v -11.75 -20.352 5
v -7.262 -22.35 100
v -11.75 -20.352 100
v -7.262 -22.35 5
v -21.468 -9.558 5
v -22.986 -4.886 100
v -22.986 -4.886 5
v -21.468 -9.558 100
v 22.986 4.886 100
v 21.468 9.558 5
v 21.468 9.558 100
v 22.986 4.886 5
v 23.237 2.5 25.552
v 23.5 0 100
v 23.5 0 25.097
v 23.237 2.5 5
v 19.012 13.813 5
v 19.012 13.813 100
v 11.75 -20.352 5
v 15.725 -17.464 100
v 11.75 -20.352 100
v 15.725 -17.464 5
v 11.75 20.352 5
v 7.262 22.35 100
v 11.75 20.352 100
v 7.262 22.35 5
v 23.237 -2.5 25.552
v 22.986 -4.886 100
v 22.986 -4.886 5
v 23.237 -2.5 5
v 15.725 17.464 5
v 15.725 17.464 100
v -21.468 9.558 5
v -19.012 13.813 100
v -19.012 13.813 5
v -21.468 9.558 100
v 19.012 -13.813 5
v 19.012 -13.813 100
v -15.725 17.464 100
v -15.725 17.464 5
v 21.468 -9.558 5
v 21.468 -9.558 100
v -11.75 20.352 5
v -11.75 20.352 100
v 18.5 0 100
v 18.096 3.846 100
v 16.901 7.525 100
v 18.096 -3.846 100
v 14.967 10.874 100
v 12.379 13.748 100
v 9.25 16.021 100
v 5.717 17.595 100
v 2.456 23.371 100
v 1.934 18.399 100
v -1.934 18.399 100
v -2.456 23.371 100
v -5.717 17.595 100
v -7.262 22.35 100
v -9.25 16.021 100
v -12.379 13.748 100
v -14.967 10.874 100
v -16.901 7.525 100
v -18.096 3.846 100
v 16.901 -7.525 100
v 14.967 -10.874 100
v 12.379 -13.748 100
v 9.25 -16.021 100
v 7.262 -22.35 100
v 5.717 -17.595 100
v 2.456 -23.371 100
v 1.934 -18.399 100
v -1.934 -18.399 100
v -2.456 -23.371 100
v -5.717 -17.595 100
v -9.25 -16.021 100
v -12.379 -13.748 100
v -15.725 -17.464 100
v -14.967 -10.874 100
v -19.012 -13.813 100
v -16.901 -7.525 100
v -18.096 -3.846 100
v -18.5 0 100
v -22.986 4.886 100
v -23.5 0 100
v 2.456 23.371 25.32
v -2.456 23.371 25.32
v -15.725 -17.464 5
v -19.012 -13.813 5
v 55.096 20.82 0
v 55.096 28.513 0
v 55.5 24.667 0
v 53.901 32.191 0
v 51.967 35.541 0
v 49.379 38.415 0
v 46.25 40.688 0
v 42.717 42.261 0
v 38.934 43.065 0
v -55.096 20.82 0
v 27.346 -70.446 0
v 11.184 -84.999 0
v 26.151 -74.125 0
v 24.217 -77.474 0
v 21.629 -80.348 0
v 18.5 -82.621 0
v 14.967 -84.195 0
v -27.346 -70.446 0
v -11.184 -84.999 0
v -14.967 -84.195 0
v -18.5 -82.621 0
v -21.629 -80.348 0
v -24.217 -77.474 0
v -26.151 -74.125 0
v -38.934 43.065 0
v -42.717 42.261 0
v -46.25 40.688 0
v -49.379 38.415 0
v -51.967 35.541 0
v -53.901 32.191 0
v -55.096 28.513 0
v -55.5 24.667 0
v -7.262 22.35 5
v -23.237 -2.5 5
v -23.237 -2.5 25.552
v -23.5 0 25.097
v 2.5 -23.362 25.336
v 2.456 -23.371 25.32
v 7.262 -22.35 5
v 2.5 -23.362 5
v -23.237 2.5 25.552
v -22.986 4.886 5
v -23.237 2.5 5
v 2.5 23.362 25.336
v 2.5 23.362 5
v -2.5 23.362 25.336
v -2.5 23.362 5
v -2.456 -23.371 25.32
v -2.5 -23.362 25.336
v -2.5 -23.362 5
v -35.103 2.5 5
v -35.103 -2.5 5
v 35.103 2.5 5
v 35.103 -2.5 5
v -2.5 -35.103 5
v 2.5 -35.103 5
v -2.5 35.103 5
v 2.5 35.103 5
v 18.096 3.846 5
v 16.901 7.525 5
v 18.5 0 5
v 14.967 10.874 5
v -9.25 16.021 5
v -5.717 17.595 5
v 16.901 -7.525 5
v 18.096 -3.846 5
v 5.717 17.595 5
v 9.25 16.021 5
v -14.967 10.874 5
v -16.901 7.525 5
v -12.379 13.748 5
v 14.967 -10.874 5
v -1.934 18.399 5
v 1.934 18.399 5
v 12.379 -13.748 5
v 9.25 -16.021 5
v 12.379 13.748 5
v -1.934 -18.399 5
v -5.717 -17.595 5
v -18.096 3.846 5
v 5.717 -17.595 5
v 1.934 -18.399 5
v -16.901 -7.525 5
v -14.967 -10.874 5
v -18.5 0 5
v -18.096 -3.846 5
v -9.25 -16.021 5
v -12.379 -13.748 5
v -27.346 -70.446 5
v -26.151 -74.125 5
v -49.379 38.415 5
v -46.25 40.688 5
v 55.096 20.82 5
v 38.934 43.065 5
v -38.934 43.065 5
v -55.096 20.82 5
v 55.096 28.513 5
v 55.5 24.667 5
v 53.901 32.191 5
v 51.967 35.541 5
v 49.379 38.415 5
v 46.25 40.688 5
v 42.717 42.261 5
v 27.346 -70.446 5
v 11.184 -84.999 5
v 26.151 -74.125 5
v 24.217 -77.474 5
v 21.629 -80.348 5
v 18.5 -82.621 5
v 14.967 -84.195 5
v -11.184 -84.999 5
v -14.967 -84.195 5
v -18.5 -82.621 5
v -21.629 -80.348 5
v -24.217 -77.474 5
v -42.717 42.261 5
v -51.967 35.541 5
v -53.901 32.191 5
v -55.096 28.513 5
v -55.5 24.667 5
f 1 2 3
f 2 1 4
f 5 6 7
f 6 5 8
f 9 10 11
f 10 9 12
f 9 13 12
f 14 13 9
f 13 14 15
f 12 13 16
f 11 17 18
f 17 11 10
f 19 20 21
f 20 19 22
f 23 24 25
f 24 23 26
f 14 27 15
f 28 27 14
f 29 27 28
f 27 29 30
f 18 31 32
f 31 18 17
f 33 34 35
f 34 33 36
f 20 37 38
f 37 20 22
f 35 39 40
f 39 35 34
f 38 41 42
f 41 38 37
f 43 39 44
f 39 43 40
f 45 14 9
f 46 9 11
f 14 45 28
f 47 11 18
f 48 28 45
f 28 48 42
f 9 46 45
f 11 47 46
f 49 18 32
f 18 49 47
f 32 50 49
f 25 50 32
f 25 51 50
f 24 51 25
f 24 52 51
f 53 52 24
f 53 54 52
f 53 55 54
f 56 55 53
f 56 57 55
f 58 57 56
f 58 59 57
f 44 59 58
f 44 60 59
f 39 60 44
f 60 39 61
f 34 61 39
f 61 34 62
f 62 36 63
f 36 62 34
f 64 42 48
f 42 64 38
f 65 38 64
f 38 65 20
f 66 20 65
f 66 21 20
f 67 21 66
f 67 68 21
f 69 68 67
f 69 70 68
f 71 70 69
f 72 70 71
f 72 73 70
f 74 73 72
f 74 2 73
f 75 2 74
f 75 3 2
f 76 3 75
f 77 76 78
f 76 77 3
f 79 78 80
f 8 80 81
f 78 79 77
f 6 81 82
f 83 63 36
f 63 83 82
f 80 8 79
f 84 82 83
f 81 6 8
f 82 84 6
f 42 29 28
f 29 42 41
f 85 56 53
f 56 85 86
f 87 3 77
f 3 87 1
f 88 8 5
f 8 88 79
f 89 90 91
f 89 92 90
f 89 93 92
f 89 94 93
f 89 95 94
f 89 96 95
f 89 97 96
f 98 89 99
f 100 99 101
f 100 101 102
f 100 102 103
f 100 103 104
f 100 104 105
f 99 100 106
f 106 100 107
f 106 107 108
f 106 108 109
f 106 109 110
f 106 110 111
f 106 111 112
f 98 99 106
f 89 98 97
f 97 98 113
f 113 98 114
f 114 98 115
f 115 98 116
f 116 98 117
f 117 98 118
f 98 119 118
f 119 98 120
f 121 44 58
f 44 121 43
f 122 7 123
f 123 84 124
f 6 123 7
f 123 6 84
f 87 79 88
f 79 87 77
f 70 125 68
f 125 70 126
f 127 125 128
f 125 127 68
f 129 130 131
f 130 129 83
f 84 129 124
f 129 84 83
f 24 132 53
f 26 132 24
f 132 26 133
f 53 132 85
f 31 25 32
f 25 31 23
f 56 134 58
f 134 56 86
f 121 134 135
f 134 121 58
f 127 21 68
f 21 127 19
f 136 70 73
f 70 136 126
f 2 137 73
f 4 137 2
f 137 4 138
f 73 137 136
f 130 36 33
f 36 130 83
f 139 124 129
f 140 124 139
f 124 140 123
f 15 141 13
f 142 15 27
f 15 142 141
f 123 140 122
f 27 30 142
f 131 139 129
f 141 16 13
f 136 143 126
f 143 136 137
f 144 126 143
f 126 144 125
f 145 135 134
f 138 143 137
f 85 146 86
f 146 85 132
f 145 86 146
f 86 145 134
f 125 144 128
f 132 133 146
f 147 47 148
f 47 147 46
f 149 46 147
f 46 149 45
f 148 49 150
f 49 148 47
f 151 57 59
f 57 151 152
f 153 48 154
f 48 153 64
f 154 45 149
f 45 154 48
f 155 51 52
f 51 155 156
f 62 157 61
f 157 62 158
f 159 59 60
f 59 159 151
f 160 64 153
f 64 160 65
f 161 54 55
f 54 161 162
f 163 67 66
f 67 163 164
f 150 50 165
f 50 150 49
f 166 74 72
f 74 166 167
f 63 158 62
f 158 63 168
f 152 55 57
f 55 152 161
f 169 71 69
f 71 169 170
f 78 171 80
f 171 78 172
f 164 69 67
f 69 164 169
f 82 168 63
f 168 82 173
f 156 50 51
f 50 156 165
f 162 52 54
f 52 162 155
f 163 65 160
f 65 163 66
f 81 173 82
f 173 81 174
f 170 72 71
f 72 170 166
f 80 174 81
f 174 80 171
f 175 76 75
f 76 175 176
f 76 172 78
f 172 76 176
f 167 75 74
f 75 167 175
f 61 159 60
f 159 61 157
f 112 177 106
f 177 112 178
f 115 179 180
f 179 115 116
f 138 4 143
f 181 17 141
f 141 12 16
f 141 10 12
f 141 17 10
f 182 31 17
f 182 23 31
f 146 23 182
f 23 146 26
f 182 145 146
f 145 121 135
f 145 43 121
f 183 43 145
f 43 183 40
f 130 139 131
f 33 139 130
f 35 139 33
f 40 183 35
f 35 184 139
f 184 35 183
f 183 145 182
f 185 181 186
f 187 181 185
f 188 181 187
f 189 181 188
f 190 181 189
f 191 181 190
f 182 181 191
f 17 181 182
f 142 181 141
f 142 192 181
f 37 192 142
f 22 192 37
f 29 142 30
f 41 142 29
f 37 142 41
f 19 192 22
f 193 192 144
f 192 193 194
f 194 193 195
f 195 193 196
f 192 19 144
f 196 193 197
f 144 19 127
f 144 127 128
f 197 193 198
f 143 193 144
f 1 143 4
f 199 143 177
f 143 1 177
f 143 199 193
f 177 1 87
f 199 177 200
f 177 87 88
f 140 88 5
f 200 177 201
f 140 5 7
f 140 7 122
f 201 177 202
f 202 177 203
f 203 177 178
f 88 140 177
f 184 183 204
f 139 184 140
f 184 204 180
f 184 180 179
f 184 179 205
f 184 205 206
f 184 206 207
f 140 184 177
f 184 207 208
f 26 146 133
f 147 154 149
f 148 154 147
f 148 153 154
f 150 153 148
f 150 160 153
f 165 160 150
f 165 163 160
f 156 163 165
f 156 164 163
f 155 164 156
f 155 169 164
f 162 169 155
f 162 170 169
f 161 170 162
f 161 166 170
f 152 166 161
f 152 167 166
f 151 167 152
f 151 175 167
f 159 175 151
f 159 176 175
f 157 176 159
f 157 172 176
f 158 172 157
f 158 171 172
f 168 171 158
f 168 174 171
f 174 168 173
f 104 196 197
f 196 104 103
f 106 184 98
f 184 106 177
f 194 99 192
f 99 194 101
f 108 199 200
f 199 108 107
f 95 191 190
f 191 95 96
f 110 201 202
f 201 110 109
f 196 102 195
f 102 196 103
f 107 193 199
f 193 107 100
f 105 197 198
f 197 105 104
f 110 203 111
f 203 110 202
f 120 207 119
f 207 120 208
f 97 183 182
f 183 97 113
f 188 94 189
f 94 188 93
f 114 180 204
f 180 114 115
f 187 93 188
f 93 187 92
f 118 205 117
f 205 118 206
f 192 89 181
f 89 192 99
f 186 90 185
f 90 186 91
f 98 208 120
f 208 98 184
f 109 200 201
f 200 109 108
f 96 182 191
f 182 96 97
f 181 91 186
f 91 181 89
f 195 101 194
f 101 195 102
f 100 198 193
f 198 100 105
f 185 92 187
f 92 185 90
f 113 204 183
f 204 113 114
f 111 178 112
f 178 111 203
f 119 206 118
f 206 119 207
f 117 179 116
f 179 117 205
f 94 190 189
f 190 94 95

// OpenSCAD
// SPDX-FileCopyrightText: 2021 Jens Meisner <jens.meisner@ose-germany.de>
//
// SPDX-License-Identifier: CC-BY-SA-4.0

/*File Info--------------------------------------------------------------------
File Name: PoleBase.scad
Project Name: OpenHardware LOOM - OHLOOM
License: Attribution-ShareAlike 4.0 International (CC BY-SA 4.0) 
Name: Jens Meisner
Date: 08/01/20
Desc:  This file is part of the OHLOOM Project. Original design by Oliver Slueter, who made all wooden parts without a CNC Router. https://wiki.opensourceecology.de/Open_Hardware-Webstuhl_%E2%80%93_OHLOOM
Usage: 
./OHLoom_Documentation/Assembly_Guide/AssemblyGuide.md
./OHLoom_Documentation/User_Guide/OHLOOM_UserGuide.md
/*
/*Modifications------------------------------------------------------------
New File Name: Enter name, if it has changed
Name: Enter name of author
Date: 
Desc: Describe changes of the original design
*/
//Please continue with any fur enter any further modification here
//--------------------------------------------------------------------------------

d1=47;  //outer diameter
d2=37;  //inner diameter
h1=100; //cylinder height
h2=5;   //base thickness

union()
{
    hull()
    {
        translate([-d2/4,-d2*1.8,0])
        cylinder(h=h2,d=d2);
        translate([d2/4,-d2*1.8,0])
        cylinder(h=h2,d=d2);
        translate([-d2,d2/1.5,0])
        cylinder(h=h2,d=d2);
        translate([d2,d2/1.5,0])
        cylinder(h=h2,d=d2);
    }
    difference()
    {
        union()
        {
            cylinder(h=h1,d=d1);
            translate([0,h2/2,d1/2])
            rotate([90,30,0])
            cylinder(h=h2,d=d1*1.8,$fn=3);
            translate([h2/2,0,d1/2])
            rotate([90,30,-90])
            cylinder(h=h2,d=d1*1.8,$fn=3);
        }       
        cylinder(h=h1,d=d2);
    }
}
